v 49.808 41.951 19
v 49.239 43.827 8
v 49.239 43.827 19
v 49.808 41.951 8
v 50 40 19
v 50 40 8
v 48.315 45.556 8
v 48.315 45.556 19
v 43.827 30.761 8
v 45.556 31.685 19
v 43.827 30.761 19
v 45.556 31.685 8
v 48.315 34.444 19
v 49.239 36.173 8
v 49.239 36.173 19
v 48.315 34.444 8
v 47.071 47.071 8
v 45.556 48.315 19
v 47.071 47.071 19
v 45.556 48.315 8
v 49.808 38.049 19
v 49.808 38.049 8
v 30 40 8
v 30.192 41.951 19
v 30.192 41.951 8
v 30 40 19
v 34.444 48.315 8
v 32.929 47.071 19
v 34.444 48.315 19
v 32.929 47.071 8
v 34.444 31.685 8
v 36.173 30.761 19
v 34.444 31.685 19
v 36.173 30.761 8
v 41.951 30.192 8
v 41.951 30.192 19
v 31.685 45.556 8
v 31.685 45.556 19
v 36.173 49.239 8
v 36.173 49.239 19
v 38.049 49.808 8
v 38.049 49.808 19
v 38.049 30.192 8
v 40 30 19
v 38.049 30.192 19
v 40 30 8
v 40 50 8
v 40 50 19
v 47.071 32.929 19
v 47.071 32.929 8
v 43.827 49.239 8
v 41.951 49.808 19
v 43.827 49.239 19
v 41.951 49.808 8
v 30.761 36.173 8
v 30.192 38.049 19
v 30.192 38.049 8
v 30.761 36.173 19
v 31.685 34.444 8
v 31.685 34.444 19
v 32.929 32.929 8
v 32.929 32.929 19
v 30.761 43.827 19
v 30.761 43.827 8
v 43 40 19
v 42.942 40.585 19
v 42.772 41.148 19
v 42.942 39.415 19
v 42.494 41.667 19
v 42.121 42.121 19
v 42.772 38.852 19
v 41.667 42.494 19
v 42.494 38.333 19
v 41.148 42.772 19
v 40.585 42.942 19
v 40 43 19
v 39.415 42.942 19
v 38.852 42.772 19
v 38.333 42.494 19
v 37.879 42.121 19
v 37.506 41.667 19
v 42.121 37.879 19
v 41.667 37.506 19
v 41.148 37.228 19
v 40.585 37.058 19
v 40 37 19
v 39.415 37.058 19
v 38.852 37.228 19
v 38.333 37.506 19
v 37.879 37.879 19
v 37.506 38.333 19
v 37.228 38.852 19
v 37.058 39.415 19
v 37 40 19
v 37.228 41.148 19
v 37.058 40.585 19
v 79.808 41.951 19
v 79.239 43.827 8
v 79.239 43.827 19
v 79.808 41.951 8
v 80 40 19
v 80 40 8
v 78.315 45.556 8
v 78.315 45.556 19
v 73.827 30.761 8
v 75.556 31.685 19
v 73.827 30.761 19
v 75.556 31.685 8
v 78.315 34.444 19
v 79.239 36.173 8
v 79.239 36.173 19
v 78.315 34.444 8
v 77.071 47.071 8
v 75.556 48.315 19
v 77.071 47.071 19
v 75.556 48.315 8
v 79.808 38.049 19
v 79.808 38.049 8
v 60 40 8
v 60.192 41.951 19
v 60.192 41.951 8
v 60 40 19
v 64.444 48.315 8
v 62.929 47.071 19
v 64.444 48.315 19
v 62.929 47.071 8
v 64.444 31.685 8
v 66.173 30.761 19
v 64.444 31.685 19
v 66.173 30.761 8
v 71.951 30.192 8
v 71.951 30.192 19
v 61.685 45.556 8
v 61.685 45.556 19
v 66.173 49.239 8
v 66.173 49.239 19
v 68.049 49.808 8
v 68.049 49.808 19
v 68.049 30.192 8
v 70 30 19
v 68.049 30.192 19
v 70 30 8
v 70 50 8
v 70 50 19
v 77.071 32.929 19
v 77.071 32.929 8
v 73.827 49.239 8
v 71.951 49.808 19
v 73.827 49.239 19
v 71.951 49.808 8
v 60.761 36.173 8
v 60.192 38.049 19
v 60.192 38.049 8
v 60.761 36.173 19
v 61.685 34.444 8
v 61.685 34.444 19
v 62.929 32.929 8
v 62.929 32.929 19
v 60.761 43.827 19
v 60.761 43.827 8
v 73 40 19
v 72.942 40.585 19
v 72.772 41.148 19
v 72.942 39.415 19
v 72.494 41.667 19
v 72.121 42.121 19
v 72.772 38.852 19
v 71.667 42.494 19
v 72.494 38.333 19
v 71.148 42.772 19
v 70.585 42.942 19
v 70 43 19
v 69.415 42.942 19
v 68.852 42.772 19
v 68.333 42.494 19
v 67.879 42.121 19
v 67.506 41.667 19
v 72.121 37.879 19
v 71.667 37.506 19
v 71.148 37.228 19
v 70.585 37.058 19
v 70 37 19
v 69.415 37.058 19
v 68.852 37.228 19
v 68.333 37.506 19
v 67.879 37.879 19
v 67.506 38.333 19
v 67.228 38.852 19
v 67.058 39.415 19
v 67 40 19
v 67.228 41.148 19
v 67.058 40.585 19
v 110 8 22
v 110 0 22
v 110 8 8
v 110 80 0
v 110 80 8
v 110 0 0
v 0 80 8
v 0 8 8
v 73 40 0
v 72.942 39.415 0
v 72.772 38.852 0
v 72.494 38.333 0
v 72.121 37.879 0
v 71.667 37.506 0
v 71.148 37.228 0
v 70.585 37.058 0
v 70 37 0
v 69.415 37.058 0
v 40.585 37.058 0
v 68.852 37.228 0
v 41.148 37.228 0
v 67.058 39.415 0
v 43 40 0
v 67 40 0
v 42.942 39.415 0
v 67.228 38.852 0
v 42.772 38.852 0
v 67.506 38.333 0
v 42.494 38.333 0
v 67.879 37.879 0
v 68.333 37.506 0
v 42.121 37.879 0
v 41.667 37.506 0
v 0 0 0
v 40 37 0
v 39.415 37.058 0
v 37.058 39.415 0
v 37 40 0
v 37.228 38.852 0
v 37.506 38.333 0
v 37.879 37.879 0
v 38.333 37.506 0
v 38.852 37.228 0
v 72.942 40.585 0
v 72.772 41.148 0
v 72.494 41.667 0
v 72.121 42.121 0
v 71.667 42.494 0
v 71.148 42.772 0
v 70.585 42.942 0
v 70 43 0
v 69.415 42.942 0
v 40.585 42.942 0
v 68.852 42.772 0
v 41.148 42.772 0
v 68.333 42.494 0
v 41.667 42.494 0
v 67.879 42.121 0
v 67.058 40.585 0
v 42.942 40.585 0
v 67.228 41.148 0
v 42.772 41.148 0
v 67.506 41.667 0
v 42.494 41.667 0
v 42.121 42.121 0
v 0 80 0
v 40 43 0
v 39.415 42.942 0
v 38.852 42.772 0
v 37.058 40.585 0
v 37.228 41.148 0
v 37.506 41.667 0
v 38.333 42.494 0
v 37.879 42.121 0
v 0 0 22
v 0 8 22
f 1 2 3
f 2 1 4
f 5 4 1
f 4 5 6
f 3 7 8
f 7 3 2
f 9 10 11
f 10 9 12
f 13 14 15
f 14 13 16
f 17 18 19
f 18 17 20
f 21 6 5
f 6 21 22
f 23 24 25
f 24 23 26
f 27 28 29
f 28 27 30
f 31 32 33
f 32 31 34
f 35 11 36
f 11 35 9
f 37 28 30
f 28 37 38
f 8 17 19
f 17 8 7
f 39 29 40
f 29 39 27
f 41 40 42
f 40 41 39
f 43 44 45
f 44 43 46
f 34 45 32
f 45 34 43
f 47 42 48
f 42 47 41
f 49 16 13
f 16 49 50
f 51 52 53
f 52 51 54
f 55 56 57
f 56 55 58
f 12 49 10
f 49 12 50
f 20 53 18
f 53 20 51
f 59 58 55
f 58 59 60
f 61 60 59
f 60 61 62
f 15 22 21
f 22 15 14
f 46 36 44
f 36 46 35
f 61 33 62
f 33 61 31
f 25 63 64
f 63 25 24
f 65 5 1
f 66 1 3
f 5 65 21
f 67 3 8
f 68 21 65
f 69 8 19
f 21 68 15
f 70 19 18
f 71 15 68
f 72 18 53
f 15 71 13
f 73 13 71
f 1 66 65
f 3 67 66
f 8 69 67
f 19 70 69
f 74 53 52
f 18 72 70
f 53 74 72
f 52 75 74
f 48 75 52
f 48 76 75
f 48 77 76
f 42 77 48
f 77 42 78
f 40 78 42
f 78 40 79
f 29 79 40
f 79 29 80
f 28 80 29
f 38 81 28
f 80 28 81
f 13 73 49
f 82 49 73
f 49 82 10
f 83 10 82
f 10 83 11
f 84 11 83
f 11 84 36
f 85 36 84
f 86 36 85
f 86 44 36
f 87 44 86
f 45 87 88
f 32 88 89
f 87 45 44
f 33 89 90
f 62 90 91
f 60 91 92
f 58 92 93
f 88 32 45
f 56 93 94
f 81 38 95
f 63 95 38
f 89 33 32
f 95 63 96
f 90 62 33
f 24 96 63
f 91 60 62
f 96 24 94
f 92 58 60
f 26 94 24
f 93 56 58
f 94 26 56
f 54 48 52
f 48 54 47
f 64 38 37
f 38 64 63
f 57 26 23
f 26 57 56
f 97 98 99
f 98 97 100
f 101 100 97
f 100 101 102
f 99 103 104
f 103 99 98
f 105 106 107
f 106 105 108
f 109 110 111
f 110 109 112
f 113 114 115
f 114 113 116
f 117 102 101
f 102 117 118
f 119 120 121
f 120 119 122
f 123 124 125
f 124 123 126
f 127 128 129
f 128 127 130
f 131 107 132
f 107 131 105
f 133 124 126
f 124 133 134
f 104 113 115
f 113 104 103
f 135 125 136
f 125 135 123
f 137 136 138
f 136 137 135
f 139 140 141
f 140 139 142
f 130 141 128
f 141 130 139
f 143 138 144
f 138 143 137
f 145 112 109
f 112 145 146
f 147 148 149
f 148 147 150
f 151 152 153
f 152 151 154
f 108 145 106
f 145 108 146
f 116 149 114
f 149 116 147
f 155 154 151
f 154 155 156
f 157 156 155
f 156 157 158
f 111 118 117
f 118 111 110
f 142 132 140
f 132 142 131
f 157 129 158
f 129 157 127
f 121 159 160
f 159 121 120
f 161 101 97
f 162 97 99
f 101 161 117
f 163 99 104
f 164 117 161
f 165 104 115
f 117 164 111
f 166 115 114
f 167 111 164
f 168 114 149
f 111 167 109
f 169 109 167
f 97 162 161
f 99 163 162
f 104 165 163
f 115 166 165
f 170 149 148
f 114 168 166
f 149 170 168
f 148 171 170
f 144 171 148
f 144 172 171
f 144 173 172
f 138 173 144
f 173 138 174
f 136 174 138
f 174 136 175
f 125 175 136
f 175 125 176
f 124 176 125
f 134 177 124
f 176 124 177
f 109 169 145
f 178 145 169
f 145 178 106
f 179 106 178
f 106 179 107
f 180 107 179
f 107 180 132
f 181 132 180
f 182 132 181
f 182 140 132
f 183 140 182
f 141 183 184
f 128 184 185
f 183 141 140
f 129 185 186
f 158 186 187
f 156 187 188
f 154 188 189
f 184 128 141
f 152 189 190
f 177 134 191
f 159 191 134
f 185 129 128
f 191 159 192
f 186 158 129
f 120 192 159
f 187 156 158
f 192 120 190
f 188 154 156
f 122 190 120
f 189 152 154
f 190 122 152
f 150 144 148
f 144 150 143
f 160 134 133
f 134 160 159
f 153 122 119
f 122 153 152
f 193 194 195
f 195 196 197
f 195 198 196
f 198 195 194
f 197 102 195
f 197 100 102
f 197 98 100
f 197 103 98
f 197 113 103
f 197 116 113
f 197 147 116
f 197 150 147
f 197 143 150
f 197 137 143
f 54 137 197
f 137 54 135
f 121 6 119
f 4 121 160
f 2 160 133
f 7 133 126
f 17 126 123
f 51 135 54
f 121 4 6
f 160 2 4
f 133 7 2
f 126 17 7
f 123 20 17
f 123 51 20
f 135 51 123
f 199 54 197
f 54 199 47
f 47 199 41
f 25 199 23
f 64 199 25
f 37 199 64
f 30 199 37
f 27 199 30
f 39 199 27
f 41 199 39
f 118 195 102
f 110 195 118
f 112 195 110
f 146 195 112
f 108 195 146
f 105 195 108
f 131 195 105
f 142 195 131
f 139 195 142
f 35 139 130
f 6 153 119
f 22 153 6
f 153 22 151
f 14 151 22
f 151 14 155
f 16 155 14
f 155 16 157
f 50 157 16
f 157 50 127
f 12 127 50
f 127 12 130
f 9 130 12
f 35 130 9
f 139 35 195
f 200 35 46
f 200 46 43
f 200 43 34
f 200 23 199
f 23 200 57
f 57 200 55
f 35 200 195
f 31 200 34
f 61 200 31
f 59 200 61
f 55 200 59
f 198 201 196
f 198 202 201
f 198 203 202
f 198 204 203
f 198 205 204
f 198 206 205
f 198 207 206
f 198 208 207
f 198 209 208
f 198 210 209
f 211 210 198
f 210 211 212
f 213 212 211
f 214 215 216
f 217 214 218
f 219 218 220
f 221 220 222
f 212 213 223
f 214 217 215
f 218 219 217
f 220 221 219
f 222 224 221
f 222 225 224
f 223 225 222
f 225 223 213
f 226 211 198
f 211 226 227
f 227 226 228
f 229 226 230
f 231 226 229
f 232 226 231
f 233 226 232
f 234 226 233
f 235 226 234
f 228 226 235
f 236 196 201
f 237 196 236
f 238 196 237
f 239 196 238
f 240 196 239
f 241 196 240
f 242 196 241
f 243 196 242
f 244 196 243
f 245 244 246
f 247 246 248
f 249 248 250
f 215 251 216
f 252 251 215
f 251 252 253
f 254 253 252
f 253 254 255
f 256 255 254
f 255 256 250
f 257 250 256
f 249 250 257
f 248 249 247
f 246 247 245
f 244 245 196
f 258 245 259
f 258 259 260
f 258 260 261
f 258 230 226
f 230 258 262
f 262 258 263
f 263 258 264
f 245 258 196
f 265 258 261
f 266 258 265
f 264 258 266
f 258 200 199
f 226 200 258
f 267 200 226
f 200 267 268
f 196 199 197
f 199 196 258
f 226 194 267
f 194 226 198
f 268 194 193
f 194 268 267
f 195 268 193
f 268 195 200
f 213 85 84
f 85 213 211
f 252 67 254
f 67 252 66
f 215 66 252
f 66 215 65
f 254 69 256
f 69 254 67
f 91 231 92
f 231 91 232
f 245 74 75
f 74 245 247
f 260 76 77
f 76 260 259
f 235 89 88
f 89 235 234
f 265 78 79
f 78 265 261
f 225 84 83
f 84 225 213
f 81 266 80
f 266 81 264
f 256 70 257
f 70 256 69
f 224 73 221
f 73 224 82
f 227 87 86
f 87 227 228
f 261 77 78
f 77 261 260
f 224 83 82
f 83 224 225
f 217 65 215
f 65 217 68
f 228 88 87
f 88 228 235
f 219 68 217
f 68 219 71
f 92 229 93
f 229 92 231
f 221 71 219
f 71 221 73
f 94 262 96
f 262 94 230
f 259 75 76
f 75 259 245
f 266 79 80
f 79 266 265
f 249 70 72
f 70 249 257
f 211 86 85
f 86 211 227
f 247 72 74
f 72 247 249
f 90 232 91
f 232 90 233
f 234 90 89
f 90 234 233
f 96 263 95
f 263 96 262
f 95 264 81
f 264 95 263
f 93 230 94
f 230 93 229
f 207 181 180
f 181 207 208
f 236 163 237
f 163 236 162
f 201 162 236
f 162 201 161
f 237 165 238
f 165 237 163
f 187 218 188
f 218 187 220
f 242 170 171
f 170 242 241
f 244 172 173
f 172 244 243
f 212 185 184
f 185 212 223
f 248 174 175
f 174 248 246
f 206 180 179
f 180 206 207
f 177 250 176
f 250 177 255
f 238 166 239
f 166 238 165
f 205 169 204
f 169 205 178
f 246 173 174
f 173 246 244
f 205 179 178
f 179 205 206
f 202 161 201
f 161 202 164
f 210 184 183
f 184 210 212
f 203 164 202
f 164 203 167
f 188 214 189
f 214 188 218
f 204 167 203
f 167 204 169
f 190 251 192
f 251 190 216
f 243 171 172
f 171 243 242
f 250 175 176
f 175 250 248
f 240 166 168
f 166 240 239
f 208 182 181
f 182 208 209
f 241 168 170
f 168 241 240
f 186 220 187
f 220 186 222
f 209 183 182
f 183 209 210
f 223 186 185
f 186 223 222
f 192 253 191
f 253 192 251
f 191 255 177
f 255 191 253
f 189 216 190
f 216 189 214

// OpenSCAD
$fn = 32;

// ----------------------------------------------------------------------
// Drill jig: fence jig
// ----------------------------------------------------------------------

// --- parameters (mm) ---
plate_l = 110;            // plate length, X
plate_w = 80;             // plate width, Y
plate_t = 8;              // plate thickness
boss_d = 20;              // guide boss diameter
boss_h = 12;              // boss height above the plate
guide_d = 6;              // guide hole diameter
boss_pitch = 30;          // boss pitch
fence_h = 15;             // fence height above the plate
fence_t = 8;              // fence thickness

n_boss = 2;  // guide bosses
boss_x0 = (plate_l - (n_boss - 1) * boss_pitch) / 2;  // first boss X
boss_top = plate_t - 1 + boss_h;  // boss crown height
fence_top = plate_t - 1 + fence_h;  // fence crown height
total_h = max([fence_top, boss_top]);  // overall height

difference() {
  union() {
  cube([plate_l, plate_w, plate_t]);
  for (i = [0 : n_boss - 1])
    translate([boss_x0 + i * boss_pitch, plate_w / 2, plate_t - 1])
      cylinder(h = boss_h, d = boss_d);
  translate([0, 0, plate_t - 1]) cube([plate_l, fence_t, fence_h]);
  }
  for (i = [0 : n_boss - 1])
    translate([boss_x0 + i * boss_pitch, plate_w / 2, -1])
      cylinder(h = plate_t + boss_h, d = guide_d);
}
